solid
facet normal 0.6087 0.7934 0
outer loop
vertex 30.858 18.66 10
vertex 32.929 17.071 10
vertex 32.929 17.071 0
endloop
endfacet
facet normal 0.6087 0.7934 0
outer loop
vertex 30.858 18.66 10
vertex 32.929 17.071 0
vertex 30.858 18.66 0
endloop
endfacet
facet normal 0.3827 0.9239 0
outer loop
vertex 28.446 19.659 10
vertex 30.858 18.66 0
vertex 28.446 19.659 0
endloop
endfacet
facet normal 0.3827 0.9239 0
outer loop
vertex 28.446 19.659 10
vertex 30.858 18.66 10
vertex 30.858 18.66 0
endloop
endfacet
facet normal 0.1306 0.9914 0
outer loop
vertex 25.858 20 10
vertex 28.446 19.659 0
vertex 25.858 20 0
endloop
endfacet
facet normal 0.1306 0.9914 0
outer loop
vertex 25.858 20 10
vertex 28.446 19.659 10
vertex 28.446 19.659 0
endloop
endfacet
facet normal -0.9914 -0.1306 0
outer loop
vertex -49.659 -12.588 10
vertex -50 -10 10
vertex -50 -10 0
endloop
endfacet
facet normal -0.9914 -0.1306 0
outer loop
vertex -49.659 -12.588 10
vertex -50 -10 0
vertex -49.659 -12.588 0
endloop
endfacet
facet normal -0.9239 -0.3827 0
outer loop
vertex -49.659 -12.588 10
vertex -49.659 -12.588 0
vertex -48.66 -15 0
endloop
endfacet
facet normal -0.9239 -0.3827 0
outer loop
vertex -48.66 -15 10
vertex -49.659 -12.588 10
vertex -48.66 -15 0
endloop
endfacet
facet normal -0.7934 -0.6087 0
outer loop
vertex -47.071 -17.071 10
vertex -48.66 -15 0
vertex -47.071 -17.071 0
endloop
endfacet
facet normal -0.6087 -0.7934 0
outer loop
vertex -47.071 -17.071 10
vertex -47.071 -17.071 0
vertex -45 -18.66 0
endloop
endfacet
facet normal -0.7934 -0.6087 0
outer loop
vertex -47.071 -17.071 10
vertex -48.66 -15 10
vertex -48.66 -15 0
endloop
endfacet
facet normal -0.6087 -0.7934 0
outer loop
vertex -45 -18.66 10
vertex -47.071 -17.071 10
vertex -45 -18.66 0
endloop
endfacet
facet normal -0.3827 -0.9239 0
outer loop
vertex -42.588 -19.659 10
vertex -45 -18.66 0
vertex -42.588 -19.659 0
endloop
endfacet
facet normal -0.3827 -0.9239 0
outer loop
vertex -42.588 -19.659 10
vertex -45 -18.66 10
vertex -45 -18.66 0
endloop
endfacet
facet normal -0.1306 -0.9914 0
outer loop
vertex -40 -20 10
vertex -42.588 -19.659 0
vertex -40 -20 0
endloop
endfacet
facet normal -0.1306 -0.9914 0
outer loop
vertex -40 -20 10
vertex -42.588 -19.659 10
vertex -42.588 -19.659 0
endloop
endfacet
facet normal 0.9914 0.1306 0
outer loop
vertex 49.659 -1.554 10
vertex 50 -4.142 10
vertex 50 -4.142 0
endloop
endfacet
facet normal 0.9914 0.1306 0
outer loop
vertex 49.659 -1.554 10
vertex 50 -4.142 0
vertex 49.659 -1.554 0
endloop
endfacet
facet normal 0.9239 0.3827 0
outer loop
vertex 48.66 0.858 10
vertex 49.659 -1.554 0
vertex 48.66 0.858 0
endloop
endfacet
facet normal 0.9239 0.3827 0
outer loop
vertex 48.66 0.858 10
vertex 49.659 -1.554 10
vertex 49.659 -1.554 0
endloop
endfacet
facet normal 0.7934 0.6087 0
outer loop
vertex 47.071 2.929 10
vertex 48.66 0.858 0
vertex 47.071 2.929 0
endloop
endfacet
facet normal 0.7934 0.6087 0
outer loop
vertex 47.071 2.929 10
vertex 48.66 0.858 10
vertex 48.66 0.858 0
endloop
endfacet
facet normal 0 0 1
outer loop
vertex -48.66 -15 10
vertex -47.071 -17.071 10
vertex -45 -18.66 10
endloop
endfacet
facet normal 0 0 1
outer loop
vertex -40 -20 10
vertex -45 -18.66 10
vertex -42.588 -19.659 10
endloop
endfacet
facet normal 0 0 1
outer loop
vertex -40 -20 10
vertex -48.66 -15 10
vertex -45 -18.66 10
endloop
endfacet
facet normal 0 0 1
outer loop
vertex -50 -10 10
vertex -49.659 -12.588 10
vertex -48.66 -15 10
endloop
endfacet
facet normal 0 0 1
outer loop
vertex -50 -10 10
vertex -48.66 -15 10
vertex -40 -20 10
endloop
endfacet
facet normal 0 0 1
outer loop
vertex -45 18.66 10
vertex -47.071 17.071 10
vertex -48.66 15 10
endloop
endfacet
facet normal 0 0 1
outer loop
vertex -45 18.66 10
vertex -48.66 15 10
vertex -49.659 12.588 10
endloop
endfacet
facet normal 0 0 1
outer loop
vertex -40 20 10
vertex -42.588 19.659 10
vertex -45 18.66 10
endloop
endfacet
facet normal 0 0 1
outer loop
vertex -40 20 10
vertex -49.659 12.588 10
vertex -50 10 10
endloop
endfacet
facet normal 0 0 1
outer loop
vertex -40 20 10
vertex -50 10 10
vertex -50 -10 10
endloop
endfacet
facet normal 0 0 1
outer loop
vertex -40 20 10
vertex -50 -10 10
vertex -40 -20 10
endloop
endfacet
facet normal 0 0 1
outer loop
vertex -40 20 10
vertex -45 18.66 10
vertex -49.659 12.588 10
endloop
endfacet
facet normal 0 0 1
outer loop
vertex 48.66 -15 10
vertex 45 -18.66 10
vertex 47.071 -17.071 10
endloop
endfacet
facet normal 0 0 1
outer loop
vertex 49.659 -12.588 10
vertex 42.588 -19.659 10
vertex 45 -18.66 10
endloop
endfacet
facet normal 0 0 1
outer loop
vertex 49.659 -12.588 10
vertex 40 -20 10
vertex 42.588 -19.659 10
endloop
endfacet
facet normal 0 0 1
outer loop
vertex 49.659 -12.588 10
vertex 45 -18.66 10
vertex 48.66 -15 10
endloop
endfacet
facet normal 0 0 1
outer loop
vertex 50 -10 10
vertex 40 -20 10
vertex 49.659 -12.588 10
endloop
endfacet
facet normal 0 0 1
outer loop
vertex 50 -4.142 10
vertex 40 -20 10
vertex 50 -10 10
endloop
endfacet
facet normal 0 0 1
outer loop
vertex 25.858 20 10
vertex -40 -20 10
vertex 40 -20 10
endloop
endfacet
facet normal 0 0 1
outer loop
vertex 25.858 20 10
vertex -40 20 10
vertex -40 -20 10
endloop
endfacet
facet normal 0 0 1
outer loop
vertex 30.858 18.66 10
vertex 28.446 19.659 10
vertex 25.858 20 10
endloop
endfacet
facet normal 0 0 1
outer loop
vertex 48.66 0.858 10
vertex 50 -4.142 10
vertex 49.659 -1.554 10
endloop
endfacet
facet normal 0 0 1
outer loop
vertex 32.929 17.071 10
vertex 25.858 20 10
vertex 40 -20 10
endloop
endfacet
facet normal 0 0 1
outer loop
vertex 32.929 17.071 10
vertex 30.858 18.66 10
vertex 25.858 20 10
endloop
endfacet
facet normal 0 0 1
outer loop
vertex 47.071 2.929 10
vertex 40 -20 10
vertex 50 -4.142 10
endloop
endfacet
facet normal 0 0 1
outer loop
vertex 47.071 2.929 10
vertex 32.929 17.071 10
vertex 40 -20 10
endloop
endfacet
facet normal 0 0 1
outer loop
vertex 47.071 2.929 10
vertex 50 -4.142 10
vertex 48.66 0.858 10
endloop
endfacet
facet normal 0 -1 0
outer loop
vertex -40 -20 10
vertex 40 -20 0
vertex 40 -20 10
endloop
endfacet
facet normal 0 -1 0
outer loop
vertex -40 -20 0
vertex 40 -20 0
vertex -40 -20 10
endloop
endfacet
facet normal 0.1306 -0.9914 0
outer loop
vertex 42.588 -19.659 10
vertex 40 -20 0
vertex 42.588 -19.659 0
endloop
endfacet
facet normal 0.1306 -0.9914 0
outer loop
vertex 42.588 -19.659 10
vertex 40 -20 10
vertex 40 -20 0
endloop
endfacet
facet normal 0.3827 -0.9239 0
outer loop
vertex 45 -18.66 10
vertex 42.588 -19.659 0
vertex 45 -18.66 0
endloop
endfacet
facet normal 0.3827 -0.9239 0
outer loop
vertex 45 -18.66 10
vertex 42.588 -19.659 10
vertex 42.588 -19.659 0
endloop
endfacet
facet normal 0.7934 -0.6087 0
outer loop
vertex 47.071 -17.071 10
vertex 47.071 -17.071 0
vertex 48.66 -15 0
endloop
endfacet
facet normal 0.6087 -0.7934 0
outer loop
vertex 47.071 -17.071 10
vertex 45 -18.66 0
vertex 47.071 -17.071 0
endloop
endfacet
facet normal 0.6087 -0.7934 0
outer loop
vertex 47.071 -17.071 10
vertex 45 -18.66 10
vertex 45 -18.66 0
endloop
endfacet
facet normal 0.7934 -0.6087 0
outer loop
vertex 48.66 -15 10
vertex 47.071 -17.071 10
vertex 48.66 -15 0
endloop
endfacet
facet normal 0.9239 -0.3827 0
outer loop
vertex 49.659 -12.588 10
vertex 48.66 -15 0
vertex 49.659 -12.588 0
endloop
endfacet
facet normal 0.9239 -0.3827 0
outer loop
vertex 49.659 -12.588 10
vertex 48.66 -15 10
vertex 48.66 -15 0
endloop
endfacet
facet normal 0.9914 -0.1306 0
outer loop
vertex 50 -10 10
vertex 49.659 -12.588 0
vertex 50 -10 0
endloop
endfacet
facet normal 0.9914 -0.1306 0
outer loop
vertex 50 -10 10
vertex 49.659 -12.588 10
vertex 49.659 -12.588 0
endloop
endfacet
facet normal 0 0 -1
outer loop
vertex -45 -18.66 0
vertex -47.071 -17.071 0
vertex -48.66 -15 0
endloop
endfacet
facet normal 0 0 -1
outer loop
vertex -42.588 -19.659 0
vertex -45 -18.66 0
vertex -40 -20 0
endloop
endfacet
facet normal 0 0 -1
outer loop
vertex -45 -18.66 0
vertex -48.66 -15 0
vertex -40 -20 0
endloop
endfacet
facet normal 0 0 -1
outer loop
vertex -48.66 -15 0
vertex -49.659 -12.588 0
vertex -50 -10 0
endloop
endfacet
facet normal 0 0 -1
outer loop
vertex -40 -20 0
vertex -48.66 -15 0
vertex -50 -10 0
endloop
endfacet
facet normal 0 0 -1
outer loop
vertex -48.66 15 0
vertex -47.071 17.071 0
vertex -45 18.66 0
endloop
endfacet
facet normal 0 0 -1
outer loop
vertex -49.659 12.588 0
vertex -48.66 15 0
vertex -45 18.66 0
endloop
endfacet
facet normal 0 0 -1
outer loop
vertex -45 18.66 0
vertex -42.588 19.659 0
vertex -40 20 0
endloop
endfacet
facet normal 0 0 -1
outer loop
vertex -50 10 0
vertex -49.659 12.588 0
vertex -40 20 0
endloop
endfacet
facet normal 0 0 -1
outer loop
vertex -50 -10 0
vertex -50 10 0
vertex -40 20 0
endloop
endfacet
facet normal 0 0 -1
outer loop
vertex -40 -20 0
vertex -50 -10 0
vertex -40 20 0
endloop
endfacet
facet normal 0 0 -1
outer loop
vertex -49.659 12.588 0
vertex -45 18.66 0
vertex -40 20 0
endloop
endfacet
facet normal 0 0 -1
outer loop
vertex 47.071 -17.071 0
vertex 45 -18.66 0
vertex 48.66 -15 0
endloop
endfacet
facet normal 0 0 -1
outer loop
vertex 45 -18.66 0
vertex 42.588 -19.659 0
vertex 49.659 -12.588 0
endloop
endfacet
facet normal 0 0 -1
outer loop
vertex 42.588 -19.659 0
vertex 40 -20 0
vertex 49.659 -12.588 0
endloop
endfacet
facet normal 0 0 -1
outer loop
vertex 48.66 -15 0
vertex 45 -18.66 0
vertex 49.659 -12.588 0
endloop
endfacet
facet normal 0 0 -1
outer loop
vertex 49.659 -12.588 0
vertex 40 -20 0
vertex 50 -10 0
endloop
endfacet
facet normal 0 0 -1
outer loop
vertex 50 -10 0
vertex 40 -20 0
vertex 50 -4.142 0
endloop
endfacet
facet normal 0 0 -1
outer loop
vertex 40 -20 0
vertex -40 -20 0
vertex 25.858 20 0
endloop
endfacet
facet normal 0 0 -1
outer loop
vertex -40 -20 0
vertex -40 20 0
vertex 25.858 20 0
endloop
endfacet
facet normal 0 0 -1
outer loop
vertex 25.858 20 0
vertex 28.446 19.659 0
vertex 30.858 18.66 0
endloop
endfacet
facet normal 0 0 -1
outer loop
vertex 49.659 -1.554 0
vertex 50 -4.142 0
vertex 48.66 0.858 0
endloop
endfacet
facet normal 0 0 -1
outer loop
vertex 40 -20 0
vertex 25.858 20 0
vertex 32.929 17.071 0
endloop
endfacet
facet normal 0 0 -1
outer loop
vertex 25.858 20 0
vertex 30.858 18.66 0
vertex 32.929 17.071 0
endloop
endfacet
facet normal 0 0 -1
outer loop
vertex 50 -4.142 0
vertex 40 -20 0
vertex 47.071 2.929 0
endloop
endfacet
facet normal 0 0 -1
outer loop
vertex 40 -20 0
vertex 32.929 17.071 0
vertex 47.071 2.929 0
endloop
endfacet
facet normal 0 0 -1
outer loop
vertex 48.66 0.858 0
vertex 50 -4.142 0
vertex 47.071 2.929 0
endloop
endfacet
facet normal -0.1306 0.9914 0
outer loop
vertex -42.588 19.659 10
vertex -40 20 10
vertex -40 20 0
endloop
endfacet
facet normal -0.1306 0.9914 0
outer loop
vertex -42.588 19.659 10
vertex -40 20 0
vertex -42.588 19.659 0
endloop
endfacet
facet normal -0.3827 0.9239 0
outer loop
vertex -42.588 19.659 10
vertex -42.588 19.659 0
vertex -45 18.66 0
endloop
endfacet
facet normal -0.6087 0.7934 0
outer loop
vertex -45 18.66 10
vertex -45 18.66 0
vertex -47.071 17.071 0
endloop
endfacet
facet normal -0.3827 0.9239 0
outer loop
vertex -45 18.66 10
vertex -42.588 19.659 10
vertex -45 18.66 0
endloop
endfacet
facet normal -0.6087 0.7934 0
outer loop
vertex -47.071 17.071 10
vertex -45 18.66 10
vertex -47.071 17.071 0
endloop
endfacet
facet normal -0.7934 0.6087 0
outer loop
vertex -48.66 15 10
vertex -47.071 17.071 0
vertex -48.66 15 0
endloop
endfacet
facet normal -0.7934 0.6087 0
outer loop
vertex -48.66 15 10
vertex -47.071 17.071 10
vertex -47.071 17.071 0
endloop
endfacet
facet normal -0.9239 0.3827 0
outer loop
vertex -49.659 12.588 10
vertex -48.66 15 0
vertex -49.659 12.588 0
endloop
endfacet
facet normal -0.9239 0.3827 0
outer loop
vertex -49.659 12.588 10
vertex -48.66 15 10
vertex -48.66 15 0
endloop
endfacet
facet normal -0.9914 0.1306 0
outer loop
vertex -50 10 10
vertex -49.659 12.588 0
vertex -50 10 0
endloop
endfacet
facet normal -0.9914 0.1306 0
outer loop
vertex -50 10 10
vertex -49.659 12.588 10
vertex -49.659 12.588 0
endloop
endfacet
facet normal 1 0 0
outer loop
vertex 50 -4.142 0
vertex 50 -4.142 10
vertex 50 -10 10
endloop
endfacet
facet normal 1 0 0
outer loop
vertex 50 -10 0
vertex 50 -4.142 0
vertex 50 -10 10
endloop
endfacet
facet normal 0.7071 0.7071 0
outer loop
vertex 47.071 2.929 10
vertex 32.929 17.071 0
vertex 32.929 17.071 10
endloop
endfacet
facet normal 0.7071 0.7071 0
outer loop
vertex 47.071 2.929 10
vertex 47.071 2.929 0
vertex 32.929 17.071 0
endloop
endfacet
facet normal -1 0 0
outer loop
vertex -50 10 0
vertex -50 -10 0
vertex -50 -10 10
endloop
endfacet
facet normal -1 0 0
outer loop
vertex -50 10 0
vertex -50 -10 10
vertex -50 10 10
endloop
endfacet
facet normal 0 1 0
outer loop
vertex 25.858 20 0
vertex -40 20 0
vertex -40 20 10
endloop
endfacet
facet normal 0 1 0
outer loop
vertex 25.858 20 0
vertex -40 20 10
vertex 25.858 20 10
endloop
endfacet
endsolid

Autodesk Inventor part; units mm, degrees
ref_plane "YZ Plane" through (0, 0, 0) normal (1, 0, 0) x (0, 1, 0)
ref_plane "XZ Plane" through (0, 0, 0) normal (0, 1, 0) x (-1, 0, 0)
ref_plane "XY Plane" through (0, 0, 0) normal (0, 0, 1) x (1, 0, 0)
sketch "Sketch1" plane through (0, 0, 0) normal (0, 0, 1) x (1, 0, 0)
  circle A0 centre (40, 19.5) radius 1.85 projected
  circle A1 centre (-57.5, -20.4606) radius 1.85 projected
  circle A2 centre (-57.5, 19.5) radius 1.85 projected
  circle A3 centre (57.5, -20.4606) radius 1.85 projected
  line L0 (63, 25) -> (-63, 25) projected
  line L1 (-63, 25) -> (-63, -25) projected
  line L2 (-63, -25) -> (63, -25) projected
  line L3 (63, -25) -> (63, 25) projected
  line L4 (50, -20) -> (-50, -20)
  line L5 (-50, -20) -> (-50, 20)
  line L6 (-50, 20) -> (50, 20)
  line L7 (50, 20) -> (50, -20)
  line L8 (50, -20) -> (-50, 20) construction
  line L9 (-50, -20) -> (50, 20) construction
  point P0 (0, 0)
  dimension "d0" = 40
  dimension "d1" = 100
extrude "Extrusion1" add sketch "Sketch1" along normal blind 10 contours A0 L6 | A0 L6 L7 L4 L5 picked at (39.6393, 19.3331)
chamfer "Chamfer1" distance 20 angle 45 1 edges at (50, 20, 5)
fillet "Fillet1" radius 10 5 edges at (-50, 20, 5) (30, 20, 5) (50, 0, 5) (50, -20, 5) (-50, -20, 5)
properties part number "Frame_Foot_Flex" material "Rubber, Silicone"
